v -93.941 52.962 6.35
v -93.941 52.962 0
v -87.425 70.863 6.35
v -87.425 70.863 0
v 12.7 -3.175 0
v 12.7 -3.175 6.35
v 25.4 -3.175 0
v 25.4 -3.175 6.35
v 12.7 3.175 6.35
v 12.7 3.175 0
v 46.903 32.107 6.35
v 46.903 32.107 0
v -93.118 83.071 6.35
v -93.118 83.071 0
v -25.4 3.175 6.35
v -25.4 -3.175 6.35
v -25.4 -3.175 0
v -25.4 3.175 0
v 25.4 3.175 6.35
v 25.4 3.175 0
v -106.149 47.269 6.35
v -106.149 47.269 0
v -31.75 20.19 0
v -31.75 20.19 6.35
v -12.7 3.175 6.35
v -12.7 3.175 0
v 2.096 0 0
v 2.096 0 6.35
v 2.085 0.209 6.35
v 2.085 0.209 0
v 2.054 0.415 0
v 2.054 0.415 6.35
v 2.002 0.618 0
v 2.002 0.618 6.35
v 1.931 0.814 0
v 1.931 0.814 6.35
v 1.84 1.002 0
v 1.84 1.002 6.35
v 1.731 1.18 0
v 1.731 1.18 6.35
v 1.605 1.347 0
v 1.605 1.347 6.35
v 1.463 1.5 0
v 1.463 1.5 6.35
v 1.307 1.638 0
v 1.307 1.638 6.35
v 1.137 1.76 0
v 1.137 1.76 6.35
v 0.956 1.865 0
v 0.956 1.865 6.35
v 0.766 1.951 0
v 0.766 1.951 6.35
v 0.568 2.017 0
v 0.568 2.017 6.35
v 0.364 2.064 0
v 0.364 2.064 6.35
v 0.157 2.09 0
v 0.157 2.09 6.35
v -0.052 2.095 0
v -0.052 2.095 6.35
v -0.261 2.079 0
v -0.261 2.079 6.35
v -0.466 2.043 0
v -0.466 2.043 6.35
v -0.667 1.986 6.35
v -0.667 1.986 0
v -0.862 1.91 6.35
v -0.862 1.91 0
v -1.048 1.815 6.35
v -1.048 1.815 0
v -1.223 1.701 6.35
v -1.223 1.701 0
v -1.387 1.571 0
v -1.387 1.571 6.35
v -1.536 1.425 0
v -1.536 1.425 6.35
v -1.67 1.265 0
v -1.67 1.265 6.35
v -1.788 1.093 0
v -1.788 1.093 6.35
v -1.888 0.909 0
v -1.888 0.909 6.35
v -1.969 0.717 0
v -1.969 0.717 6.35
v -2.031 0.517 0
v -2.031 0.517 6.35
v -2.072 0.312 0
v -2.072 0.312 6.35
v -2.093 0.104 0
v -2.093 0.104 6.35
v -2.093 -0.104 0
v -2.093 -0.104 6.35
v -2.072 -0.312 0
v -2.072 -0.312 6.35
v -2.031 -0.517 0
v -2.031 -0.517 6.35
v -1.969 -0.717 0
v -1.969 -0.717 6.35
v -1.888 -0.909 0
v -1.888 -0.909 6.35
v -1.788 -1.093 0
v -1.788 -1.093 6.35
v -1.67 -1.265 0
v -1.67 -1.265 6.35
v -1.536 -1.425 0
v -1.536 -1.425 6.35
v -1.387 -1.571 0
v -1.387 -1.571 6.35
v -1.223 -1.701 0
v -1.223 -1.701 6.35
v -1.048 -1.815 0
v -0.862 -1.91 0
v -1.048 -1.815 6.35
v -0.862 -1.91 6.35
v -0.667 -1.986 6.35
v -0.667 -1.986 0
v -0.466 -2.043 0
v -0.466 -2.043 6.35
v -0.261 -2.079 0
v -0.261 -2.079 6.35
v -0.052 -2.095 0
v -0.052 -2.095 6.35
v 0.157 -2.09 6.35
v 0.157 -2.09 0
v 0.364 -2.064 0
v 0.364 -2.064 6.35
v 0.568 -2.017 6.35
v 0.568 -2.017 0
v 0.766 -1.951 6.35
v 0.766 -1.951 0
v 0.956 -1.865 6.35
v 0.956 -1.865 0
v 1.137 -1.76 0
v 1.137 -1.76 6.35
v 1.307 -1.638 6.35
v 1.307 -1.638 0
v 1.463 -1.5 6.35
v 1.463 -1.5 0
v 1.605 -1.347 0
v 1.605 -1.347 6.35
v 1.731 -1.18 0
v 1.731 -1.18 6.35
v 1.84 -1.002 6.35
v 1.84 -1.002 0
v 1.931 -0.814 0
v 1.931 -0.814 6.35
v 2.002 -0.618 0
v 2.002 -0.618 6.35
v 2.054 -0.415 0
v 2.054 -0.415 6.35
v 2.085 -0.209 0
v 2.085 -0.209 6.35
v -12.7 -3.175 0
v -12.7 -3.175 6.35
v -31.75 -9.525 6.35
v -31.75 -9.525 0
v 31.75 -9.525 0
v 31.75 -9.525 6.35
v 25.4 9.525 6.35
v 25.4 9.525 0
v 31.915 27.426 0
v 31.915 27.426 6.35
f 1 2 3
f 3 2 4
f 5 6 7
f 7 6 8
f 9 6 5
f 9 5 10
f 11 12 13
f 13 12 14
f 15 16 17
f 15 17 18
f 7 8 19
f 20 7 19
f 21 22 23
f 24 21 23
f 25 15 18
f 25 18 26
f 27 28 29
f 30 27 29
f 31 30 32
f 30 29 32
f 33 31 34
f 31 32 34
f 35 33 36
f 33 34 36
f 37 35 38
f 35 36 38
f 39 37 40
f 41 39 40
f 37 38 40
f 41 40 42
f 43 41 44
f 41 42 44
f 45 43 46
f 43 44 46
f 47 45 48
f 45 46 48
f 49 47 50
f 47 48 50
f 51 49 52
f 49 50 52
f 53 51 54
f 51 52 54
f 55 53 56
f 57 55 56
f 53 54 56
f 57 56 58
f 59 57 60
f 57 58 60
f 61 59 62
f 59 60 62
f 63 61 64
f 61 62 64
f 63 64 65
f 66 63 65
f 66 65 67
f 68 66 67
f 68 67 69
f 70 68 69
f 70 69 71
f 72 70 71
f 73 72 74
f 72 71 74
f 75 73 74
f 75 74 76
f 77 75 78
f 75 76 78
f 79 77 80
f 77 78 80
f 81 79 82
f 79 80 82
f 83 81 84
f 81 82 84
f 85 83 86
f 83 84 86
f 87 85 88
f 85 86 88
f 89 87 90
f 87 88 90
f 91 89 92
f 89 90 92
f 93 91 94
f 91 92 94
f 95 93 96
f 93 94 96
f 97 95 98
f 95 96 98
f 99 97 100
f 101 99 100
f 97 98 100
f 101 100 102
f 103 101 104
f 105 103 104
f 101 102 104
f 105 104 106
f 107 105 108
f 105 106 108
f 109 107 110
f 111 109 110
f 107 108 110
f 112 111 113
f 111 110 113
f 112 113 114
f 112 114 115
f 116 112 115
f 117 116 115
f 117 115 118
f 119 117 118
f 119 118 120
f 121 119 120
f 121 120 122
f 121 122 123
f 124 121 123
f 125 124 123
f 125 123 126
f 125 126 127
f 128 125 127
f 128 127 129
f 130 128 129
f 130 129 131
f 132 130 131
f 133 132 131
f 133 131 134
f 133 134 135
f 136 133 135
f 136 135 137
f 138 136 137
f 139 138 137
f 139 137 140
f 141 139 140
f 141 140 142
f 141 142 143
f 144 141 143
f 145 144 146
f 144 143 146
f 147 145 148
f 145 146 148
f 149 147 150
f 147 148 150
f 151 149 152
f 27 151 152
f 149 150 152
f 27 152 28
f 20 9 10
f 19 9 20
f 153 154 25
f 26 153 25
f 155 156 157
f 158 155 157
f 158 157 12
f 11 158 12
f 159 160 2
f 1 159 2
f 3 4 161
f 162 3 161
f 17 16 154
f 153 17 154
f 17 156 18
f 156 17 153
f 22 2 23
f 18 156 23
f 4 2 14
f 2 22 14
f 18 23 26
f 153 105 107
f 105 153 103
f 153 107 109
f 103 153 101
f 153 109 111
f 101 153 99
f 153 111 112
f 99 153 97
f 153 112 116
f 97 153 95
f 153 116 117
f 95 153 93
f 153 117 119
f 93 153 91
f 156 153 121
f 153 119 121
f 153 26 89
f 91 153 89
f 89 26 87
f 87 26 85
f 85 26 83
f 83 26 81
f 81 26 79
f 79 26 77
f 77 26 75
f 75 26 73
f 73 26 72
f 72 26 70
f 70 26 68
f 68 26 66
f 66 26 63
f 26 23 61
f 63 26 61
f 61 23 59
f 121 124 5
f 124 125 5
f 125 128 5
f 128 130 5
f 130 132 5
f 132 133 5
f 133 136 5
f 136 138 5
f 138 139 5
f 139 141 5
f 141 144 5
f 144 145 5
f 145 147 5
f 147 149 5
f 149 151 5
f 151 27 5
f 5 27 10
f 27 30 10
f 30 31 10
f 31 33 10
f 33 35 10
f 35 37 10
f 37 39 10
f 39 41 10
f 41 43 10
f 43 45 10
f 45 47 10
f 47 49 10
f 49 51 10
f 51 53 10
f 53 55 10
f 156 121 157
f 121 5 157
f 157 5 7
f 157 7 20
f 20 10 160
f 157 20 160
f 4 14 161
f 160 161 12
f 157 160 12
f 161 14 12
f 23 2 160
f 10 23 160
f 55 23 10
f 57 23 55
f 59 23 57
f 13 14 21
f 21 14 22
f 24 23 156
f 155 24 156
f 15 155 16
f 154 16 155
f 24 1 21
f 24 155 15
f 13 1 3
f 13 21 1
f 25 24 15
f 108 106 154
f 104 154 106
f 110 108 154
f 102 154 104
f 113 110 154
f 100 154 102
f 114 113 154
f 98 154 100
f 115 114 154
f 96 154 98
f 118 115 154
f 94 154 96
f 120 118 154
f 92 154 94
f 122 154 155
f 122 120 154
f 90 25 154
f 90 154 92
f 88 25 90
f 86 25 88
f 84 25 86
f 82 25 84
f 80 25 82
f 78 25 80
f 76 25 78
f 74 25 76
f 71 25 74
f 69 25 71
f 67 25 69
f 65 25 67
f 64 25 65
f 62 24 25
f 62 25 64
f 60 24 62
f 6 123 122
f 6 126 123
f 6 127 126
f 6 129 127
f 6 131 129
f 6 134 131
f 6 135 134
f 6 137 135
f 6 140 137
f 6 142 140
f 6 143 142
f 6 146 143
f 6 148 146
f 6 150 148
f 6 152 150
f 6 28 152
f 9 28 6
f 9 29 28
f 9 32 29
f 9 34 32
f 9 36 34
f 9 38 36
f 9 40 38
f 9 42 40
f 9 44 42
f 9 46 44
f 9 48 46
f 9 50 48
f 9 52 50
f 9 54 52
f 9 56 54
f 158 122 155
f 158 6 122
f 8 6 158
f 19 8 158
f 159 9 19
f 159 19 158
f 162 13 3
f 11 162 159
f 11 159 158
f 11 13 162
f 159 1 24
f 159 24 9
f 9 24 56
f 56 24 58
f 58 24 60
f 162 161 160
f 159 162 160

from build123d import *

# Parameters (mm, degrees)
SKETCH1_W               = 63.5
SKETCH1_H               = 19.05
BOSS_EXTRUDE1_DEPTH     = 6.35
SKETCH2_R               = 2.0955
SKETCH2_W               = 12.7
SKETCH2_H               = 6.35
CUT_EXTRUDE1_DEPTH      = 6.35
BOSS_EXTRUDE2_START     = -6.35
BOSS_EXTRUDE2_OUTLINE_W = 12.7
BOSS_EXTRUDE2_OUTLINE_H = 6.35
BOSS_EXTRUDE2_OUTLINE_R = 2.0955
BOSS_EXTRUDE2_DEPTH     = 6.35


with BuildPart() as part:
    # Sketch1 → Boss-Extrude1 (new body)
    with BuildSketch(Plane.XY):
        Rectangle(SKETCH1_W, SKETCH1_H)
    extrude(amount=BOSS_EXTRUDE1_DEPTH)

    # Sketch2 → Cut-Extrude1 (cut)
    with BuildSketch(Plane.XY.offset(6.35)):
        Circle(SKETCH2_R)
        with Locations((-19.05, 0)):
            Rectangle(SKETCH2_W, SKETCH2_H)
        with Locations((19.05, 0)):
            Rectangle(SKETCH2_W, SKETCH2_H)
    extrude(amount=-CUT_EXTRUDE1_DEPTH, mode=Mode.SUBTRACT)

    # Boss-Extrude2: read off the stored shape, not the designer's step
    # Boss-Extrude2 outline → Boss-Extrude2 (add)
    with BuildSketch(Plane.XY.offset(6.35).offset(BOSS_EXTRUDE2_START)):
        Polygon((-31.75, 20.189605605), (-31.75, -9.525), (31.75, -9.525), (46.902968685, 32.107439299), (-93.118309457, 83.071016706), (-106.149276918, 47.268727855), align=None)
        with Locations((-19.05, 0)):
            Rectangle(BOSS_EXTRUDE2_OUTLINE_W, BOSS_EXTRUDE2_OUTLINE_H, mode=Mode.SUBTRACT)
        Circle(BOSS_EXTRUDE2_OUTLINE_R, mode=Mode.SUBTRACT)
        with Locations((19.05, 0)):
            Rectangle(BOSS_EXTRUDE2_OUTLINE_W, BOSS_EXTRUDE2_OUTLINE_H, mode=Mode.SUBTRACT)
        Polygon((-87.425479109, 70.862702628), (31.91548373, 27.426144426), (25.4, 9.525), (-93.94096284, 52.961558202), align=None, mode=Mode.SUBTRACT)
    extrude(amount=BOSS_EXTRUDE2_DEPTH)


solid = part.part
